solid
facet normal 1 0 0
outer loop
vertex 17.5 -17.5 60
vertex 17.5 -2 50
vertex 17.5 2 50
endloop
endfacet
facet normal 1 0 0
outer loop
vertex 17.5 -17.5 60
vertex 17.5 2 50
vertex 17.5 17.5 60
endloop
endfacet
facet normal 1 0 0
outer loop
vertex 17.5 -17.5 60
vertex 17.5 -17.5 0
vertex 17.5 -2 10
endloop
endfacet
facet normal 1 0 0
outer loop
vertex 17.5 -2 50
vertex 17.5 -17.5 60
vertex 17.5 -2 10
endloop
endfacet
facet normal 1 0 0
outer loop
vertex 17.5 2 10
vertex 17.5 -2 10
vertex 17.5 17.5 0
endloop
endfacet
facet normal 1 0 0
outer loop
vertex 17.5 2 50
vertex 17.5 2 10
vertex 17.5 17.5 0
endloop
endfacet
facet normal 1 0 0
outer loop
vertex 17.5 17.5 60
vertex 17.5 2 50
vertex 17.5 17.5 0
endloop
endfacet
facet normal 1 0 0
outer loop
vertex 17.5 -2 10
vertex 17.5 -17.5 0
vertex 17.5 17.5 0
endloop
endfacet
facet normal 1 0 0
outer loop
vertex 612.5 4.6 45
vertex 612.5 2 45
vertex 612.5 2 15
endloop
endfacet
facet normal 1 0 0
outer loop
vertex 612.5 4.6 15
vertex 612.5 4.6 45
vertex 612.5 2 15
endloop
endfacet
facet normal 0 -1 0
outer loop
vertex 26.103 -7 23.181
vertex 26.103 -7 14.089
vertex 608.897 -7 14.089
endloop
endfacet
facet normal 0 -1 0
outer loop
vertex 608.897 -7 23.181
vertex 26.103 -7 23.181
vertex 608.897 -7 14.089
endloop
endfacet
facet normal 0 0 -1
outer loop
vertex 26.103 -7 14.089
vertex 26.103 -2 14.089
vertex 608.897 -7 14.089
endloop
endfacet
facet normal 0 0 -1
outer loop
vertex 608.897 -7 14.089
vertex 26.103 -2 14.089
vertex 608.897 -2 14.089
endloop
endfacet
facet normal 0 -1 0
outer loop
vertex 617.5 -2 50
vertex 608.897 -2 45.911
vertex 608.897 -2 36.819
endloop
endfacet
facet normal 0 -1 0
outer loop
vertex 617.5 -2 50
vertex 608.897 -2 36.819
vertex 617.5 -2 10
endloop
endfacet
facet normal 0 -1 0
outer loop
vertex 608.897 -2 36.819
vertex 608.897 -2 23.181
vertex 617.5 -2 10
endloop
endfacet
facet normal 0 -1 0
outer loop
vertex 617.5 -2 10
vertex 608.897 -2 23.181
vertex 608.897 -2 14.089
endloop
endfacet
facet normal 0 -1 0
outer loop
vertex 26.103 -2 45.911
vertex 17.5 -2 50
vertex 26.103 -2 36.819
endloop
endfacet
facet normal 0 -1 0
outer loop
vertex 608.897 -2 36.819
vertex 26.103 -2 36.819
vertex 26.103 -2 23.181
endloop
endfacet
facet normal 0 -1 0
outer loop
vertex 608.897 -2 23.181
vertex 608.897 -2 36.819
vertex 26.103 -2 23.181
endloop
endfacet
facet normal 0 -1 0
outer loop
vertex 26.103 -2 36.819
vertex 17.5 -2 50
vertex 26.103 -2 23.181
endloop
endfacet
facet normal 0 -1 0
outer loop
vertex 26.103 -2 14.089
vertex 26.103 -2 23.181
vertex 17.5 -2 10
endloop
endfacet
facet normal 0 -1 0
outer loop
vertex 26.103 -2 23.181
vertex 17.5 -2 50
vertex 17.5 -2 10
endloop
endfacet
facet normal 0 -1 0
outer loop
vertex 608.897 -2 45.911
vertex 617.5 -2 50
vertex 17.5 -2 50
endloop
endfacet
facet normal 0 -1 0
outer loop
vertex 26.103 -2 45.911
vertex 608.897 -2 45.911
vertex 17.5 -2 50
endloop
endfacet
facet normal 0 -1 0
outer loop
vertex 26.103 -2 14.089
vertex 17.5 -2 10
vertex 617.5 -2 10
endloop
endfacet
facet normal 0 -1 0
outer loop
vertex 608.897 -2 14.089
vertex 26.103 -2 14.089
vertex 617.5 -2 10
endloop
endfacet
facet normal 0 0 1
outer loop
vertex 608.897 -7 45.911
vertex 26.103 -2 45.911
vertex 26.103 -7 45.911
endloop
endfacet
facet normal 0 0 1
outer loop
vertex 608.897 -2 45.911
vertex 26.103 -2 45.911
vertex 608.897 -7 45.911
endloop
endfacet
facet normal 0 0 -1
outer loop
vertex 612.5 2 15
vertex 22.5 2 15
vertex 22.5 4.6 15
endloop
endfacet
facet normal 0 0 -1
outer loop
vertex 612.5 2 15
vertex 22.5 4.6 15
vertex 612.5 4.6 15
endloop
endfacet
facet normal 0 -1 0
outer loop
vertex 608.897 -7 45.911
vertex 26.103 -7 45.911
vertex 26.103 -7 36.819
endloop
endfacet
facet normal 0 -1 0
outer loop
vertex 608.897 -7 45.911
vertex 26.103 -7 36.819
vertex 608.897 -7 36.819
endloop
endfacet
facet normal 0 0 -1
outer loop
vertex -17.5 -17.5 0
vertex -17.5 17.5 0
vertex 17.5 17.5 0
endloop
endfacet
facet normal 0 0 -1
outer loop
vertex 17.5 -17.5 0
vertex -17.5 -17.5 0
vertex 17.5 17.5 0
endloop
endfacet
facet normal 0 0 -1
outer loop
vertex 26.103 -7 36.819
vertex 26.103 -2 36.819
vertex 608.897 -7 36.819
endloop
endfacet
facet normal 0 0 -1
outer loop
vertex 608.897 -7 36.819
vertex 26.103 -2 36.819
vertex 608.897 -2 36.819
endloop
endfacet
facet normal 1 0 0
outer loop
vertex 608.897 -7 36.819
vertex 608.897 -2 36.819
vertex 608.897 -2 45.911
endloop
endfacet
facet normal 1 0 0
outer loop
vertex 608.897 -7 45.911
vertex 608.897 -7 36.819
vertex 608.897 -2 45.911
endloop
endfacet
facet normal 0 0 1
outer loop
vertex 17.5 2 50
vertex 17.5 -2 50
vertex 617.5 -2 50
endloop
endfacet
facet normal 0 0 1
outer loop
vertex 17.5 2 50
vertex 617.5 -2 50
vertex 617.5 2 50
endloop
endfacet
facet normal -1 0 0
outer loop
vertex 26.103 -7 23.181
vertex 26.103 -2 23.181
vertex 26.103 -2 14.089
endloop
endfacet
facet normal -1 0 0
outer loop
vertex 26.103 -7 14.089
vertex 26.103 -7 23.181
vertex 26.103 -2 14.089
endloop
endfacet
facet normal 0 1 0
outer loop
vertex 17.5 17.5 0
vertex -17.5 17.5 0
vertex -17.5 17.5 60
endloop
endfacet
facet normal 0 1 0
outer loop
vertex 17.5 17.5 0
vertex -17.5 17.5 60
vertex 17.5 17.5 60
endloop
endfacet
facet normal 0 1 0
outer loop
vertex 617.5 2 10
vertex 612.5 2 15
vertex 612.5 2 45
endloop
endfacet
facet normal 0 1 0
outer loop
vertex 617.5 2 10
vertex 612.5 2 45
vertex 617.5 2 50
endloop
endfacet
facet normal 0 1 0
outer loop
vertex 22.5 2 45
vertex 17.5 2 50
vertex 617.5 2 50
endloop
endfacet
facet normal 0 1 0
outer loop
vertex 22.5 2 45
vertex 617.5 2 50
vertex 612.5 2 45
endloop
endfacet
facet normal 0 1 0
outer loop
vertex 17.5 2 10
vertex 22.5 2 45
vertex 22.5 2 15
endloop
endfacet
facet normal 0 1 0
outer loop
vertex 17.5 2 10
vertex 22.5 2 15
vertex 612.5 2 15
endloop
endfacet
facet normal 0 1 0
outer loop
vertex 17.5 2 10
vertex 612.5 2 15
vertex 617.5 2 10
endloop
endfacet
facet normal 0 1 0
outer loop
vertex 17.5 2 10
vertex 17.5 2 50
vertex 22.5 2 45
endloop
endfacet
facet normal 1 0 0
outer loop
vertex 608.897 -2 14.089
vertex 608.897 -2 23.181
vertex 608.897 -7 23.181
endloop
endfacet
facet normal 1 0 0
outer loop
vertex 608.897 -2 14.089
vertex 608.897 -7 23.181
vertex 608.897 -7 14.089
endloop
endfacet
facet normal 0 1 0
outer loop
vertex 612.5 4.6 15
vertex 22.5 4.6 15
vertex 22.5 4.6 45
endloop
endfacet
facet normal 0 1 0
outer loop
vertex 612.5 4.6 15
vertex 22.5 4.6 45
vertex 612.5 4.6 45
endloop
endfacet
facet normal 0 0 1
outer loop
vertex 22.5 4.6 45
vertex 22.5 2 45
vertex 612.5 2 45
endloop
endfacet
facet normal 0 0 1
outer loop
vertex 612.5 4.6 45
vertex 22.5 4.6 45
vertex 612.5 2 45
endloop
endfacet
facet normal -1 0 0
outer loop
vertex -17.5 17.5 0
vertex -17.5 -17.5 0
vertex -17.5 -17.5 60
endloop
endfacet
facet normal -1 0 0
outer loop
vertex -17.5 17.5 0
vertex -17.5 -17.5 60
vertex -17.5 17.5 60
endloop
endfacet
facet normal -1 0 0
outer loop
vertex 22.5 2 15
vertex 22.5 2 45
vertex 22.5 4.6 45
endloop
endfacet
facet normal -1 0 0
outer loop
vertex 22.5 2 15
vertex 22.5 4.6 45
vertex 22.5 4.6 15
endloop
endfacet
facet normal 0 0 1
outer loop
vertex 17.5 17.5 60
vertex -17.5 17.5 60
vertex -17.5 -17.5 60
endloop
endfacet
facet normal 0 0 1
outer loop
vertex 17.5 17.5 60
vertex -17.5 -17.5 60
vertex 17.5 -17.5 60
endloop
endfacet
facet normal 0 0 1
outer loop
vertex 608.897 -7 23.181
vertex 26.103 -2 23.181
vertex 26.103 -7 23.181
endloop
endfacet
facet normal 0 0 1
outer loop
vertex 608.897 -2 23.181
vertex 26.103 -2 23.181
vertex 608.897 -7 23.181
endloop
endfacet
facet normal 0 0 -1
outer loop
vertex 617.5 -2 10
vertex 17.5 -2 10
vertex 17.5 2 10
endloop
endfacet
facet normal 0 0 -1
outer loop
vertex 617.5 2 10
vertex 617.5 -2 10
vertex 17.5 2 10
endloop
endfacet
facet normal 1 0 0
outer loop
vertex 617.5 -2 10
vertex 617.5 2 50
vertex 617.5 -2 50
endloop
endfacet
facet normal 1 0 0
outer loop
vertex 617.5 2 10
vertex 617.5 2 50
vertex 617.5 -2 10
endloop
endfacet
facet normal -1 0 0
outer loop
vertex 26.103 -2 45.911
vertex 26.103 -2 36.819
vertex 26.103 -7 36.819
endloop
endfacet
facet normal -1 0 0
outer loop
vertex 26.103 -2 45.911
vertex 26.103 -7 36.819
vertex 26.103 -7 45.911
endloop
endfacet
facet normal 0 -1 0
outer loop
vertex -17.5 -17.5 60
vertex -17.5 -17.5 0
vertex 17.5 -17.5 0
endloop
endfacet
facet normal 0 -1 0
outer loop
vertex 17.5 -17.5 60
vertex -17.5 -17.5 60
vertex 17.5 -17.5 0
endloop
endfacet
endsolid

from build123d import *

# Parameters (mm, degrees)
SKETCH1_W           = 35
SKETCH1_H           = 35
BOSS_EXTRUDE1_DEPTH = 60
SKETCH2_W           = 40
SKETCH2_H           = 4
BOSS_EXTRUDE2_DEPTH = 600
SKETCH3_W           = 590
SKETCH3_H           = 30
BOSS_EXTRUDE3_DEPTH = 2.6
SKETCH4_W           = 582.794141244
SKETCH4_H           = 9.091842743
BOSS_EXTRUDE6_DEPTH = 5


with BuildPart() as part:
    # Sketch1 → Boss-Extrude1 (new body)
    with BuildSketch(Plane.XY):
        Rectangle(SKETCH1_W, SKETCH1_H)
    extrude(amount=BOSS_EXTRUDE1_DEPTH)

    # Sketch2 → Boss-Extrude2 (add)
    with BuildSketch(Plane(origin=(17.5, 0, 0), x_dir=(0, 0, -1), z_dir=(1, 0, 0))):
        with Locations((-30, 0)):
            Rectangle(SKETCH2_W, SKETCH2_H)
    extrude(amount=BOSS_EXTRUDE2_DEPTH)

    # Sketch3 → Boss-Extrude3 (add)
    with BuildSketch(Plane(origin=(0, 2, 0), x_dir=(1, 0, 0), z_dir=(0, 1, 0))):
        with Locations((317.5, -30)):
            Rectangle(SKETCH3_W, SKETCH3_H)
    extrude(amount=BOSS_EXTRUDE3_DEPTH)

    # Sketch4 → Boss-Extrude6 (add)
    with BuildSketch(Plane.XZ.offset(2)):
        with Locations((317.5, 41.36480343)):
            Rectangle(SKETCH4_W, SKETCH4_H)
    boss_extrude6 = extrude(amount=BOSS_EXTRUDE6_DEPTH)

    # Mirror1: Boss-Extrude6 across plane
    add(boss_extrude6.mirror(Plane.XY.offset(30)))


solid = part.part
